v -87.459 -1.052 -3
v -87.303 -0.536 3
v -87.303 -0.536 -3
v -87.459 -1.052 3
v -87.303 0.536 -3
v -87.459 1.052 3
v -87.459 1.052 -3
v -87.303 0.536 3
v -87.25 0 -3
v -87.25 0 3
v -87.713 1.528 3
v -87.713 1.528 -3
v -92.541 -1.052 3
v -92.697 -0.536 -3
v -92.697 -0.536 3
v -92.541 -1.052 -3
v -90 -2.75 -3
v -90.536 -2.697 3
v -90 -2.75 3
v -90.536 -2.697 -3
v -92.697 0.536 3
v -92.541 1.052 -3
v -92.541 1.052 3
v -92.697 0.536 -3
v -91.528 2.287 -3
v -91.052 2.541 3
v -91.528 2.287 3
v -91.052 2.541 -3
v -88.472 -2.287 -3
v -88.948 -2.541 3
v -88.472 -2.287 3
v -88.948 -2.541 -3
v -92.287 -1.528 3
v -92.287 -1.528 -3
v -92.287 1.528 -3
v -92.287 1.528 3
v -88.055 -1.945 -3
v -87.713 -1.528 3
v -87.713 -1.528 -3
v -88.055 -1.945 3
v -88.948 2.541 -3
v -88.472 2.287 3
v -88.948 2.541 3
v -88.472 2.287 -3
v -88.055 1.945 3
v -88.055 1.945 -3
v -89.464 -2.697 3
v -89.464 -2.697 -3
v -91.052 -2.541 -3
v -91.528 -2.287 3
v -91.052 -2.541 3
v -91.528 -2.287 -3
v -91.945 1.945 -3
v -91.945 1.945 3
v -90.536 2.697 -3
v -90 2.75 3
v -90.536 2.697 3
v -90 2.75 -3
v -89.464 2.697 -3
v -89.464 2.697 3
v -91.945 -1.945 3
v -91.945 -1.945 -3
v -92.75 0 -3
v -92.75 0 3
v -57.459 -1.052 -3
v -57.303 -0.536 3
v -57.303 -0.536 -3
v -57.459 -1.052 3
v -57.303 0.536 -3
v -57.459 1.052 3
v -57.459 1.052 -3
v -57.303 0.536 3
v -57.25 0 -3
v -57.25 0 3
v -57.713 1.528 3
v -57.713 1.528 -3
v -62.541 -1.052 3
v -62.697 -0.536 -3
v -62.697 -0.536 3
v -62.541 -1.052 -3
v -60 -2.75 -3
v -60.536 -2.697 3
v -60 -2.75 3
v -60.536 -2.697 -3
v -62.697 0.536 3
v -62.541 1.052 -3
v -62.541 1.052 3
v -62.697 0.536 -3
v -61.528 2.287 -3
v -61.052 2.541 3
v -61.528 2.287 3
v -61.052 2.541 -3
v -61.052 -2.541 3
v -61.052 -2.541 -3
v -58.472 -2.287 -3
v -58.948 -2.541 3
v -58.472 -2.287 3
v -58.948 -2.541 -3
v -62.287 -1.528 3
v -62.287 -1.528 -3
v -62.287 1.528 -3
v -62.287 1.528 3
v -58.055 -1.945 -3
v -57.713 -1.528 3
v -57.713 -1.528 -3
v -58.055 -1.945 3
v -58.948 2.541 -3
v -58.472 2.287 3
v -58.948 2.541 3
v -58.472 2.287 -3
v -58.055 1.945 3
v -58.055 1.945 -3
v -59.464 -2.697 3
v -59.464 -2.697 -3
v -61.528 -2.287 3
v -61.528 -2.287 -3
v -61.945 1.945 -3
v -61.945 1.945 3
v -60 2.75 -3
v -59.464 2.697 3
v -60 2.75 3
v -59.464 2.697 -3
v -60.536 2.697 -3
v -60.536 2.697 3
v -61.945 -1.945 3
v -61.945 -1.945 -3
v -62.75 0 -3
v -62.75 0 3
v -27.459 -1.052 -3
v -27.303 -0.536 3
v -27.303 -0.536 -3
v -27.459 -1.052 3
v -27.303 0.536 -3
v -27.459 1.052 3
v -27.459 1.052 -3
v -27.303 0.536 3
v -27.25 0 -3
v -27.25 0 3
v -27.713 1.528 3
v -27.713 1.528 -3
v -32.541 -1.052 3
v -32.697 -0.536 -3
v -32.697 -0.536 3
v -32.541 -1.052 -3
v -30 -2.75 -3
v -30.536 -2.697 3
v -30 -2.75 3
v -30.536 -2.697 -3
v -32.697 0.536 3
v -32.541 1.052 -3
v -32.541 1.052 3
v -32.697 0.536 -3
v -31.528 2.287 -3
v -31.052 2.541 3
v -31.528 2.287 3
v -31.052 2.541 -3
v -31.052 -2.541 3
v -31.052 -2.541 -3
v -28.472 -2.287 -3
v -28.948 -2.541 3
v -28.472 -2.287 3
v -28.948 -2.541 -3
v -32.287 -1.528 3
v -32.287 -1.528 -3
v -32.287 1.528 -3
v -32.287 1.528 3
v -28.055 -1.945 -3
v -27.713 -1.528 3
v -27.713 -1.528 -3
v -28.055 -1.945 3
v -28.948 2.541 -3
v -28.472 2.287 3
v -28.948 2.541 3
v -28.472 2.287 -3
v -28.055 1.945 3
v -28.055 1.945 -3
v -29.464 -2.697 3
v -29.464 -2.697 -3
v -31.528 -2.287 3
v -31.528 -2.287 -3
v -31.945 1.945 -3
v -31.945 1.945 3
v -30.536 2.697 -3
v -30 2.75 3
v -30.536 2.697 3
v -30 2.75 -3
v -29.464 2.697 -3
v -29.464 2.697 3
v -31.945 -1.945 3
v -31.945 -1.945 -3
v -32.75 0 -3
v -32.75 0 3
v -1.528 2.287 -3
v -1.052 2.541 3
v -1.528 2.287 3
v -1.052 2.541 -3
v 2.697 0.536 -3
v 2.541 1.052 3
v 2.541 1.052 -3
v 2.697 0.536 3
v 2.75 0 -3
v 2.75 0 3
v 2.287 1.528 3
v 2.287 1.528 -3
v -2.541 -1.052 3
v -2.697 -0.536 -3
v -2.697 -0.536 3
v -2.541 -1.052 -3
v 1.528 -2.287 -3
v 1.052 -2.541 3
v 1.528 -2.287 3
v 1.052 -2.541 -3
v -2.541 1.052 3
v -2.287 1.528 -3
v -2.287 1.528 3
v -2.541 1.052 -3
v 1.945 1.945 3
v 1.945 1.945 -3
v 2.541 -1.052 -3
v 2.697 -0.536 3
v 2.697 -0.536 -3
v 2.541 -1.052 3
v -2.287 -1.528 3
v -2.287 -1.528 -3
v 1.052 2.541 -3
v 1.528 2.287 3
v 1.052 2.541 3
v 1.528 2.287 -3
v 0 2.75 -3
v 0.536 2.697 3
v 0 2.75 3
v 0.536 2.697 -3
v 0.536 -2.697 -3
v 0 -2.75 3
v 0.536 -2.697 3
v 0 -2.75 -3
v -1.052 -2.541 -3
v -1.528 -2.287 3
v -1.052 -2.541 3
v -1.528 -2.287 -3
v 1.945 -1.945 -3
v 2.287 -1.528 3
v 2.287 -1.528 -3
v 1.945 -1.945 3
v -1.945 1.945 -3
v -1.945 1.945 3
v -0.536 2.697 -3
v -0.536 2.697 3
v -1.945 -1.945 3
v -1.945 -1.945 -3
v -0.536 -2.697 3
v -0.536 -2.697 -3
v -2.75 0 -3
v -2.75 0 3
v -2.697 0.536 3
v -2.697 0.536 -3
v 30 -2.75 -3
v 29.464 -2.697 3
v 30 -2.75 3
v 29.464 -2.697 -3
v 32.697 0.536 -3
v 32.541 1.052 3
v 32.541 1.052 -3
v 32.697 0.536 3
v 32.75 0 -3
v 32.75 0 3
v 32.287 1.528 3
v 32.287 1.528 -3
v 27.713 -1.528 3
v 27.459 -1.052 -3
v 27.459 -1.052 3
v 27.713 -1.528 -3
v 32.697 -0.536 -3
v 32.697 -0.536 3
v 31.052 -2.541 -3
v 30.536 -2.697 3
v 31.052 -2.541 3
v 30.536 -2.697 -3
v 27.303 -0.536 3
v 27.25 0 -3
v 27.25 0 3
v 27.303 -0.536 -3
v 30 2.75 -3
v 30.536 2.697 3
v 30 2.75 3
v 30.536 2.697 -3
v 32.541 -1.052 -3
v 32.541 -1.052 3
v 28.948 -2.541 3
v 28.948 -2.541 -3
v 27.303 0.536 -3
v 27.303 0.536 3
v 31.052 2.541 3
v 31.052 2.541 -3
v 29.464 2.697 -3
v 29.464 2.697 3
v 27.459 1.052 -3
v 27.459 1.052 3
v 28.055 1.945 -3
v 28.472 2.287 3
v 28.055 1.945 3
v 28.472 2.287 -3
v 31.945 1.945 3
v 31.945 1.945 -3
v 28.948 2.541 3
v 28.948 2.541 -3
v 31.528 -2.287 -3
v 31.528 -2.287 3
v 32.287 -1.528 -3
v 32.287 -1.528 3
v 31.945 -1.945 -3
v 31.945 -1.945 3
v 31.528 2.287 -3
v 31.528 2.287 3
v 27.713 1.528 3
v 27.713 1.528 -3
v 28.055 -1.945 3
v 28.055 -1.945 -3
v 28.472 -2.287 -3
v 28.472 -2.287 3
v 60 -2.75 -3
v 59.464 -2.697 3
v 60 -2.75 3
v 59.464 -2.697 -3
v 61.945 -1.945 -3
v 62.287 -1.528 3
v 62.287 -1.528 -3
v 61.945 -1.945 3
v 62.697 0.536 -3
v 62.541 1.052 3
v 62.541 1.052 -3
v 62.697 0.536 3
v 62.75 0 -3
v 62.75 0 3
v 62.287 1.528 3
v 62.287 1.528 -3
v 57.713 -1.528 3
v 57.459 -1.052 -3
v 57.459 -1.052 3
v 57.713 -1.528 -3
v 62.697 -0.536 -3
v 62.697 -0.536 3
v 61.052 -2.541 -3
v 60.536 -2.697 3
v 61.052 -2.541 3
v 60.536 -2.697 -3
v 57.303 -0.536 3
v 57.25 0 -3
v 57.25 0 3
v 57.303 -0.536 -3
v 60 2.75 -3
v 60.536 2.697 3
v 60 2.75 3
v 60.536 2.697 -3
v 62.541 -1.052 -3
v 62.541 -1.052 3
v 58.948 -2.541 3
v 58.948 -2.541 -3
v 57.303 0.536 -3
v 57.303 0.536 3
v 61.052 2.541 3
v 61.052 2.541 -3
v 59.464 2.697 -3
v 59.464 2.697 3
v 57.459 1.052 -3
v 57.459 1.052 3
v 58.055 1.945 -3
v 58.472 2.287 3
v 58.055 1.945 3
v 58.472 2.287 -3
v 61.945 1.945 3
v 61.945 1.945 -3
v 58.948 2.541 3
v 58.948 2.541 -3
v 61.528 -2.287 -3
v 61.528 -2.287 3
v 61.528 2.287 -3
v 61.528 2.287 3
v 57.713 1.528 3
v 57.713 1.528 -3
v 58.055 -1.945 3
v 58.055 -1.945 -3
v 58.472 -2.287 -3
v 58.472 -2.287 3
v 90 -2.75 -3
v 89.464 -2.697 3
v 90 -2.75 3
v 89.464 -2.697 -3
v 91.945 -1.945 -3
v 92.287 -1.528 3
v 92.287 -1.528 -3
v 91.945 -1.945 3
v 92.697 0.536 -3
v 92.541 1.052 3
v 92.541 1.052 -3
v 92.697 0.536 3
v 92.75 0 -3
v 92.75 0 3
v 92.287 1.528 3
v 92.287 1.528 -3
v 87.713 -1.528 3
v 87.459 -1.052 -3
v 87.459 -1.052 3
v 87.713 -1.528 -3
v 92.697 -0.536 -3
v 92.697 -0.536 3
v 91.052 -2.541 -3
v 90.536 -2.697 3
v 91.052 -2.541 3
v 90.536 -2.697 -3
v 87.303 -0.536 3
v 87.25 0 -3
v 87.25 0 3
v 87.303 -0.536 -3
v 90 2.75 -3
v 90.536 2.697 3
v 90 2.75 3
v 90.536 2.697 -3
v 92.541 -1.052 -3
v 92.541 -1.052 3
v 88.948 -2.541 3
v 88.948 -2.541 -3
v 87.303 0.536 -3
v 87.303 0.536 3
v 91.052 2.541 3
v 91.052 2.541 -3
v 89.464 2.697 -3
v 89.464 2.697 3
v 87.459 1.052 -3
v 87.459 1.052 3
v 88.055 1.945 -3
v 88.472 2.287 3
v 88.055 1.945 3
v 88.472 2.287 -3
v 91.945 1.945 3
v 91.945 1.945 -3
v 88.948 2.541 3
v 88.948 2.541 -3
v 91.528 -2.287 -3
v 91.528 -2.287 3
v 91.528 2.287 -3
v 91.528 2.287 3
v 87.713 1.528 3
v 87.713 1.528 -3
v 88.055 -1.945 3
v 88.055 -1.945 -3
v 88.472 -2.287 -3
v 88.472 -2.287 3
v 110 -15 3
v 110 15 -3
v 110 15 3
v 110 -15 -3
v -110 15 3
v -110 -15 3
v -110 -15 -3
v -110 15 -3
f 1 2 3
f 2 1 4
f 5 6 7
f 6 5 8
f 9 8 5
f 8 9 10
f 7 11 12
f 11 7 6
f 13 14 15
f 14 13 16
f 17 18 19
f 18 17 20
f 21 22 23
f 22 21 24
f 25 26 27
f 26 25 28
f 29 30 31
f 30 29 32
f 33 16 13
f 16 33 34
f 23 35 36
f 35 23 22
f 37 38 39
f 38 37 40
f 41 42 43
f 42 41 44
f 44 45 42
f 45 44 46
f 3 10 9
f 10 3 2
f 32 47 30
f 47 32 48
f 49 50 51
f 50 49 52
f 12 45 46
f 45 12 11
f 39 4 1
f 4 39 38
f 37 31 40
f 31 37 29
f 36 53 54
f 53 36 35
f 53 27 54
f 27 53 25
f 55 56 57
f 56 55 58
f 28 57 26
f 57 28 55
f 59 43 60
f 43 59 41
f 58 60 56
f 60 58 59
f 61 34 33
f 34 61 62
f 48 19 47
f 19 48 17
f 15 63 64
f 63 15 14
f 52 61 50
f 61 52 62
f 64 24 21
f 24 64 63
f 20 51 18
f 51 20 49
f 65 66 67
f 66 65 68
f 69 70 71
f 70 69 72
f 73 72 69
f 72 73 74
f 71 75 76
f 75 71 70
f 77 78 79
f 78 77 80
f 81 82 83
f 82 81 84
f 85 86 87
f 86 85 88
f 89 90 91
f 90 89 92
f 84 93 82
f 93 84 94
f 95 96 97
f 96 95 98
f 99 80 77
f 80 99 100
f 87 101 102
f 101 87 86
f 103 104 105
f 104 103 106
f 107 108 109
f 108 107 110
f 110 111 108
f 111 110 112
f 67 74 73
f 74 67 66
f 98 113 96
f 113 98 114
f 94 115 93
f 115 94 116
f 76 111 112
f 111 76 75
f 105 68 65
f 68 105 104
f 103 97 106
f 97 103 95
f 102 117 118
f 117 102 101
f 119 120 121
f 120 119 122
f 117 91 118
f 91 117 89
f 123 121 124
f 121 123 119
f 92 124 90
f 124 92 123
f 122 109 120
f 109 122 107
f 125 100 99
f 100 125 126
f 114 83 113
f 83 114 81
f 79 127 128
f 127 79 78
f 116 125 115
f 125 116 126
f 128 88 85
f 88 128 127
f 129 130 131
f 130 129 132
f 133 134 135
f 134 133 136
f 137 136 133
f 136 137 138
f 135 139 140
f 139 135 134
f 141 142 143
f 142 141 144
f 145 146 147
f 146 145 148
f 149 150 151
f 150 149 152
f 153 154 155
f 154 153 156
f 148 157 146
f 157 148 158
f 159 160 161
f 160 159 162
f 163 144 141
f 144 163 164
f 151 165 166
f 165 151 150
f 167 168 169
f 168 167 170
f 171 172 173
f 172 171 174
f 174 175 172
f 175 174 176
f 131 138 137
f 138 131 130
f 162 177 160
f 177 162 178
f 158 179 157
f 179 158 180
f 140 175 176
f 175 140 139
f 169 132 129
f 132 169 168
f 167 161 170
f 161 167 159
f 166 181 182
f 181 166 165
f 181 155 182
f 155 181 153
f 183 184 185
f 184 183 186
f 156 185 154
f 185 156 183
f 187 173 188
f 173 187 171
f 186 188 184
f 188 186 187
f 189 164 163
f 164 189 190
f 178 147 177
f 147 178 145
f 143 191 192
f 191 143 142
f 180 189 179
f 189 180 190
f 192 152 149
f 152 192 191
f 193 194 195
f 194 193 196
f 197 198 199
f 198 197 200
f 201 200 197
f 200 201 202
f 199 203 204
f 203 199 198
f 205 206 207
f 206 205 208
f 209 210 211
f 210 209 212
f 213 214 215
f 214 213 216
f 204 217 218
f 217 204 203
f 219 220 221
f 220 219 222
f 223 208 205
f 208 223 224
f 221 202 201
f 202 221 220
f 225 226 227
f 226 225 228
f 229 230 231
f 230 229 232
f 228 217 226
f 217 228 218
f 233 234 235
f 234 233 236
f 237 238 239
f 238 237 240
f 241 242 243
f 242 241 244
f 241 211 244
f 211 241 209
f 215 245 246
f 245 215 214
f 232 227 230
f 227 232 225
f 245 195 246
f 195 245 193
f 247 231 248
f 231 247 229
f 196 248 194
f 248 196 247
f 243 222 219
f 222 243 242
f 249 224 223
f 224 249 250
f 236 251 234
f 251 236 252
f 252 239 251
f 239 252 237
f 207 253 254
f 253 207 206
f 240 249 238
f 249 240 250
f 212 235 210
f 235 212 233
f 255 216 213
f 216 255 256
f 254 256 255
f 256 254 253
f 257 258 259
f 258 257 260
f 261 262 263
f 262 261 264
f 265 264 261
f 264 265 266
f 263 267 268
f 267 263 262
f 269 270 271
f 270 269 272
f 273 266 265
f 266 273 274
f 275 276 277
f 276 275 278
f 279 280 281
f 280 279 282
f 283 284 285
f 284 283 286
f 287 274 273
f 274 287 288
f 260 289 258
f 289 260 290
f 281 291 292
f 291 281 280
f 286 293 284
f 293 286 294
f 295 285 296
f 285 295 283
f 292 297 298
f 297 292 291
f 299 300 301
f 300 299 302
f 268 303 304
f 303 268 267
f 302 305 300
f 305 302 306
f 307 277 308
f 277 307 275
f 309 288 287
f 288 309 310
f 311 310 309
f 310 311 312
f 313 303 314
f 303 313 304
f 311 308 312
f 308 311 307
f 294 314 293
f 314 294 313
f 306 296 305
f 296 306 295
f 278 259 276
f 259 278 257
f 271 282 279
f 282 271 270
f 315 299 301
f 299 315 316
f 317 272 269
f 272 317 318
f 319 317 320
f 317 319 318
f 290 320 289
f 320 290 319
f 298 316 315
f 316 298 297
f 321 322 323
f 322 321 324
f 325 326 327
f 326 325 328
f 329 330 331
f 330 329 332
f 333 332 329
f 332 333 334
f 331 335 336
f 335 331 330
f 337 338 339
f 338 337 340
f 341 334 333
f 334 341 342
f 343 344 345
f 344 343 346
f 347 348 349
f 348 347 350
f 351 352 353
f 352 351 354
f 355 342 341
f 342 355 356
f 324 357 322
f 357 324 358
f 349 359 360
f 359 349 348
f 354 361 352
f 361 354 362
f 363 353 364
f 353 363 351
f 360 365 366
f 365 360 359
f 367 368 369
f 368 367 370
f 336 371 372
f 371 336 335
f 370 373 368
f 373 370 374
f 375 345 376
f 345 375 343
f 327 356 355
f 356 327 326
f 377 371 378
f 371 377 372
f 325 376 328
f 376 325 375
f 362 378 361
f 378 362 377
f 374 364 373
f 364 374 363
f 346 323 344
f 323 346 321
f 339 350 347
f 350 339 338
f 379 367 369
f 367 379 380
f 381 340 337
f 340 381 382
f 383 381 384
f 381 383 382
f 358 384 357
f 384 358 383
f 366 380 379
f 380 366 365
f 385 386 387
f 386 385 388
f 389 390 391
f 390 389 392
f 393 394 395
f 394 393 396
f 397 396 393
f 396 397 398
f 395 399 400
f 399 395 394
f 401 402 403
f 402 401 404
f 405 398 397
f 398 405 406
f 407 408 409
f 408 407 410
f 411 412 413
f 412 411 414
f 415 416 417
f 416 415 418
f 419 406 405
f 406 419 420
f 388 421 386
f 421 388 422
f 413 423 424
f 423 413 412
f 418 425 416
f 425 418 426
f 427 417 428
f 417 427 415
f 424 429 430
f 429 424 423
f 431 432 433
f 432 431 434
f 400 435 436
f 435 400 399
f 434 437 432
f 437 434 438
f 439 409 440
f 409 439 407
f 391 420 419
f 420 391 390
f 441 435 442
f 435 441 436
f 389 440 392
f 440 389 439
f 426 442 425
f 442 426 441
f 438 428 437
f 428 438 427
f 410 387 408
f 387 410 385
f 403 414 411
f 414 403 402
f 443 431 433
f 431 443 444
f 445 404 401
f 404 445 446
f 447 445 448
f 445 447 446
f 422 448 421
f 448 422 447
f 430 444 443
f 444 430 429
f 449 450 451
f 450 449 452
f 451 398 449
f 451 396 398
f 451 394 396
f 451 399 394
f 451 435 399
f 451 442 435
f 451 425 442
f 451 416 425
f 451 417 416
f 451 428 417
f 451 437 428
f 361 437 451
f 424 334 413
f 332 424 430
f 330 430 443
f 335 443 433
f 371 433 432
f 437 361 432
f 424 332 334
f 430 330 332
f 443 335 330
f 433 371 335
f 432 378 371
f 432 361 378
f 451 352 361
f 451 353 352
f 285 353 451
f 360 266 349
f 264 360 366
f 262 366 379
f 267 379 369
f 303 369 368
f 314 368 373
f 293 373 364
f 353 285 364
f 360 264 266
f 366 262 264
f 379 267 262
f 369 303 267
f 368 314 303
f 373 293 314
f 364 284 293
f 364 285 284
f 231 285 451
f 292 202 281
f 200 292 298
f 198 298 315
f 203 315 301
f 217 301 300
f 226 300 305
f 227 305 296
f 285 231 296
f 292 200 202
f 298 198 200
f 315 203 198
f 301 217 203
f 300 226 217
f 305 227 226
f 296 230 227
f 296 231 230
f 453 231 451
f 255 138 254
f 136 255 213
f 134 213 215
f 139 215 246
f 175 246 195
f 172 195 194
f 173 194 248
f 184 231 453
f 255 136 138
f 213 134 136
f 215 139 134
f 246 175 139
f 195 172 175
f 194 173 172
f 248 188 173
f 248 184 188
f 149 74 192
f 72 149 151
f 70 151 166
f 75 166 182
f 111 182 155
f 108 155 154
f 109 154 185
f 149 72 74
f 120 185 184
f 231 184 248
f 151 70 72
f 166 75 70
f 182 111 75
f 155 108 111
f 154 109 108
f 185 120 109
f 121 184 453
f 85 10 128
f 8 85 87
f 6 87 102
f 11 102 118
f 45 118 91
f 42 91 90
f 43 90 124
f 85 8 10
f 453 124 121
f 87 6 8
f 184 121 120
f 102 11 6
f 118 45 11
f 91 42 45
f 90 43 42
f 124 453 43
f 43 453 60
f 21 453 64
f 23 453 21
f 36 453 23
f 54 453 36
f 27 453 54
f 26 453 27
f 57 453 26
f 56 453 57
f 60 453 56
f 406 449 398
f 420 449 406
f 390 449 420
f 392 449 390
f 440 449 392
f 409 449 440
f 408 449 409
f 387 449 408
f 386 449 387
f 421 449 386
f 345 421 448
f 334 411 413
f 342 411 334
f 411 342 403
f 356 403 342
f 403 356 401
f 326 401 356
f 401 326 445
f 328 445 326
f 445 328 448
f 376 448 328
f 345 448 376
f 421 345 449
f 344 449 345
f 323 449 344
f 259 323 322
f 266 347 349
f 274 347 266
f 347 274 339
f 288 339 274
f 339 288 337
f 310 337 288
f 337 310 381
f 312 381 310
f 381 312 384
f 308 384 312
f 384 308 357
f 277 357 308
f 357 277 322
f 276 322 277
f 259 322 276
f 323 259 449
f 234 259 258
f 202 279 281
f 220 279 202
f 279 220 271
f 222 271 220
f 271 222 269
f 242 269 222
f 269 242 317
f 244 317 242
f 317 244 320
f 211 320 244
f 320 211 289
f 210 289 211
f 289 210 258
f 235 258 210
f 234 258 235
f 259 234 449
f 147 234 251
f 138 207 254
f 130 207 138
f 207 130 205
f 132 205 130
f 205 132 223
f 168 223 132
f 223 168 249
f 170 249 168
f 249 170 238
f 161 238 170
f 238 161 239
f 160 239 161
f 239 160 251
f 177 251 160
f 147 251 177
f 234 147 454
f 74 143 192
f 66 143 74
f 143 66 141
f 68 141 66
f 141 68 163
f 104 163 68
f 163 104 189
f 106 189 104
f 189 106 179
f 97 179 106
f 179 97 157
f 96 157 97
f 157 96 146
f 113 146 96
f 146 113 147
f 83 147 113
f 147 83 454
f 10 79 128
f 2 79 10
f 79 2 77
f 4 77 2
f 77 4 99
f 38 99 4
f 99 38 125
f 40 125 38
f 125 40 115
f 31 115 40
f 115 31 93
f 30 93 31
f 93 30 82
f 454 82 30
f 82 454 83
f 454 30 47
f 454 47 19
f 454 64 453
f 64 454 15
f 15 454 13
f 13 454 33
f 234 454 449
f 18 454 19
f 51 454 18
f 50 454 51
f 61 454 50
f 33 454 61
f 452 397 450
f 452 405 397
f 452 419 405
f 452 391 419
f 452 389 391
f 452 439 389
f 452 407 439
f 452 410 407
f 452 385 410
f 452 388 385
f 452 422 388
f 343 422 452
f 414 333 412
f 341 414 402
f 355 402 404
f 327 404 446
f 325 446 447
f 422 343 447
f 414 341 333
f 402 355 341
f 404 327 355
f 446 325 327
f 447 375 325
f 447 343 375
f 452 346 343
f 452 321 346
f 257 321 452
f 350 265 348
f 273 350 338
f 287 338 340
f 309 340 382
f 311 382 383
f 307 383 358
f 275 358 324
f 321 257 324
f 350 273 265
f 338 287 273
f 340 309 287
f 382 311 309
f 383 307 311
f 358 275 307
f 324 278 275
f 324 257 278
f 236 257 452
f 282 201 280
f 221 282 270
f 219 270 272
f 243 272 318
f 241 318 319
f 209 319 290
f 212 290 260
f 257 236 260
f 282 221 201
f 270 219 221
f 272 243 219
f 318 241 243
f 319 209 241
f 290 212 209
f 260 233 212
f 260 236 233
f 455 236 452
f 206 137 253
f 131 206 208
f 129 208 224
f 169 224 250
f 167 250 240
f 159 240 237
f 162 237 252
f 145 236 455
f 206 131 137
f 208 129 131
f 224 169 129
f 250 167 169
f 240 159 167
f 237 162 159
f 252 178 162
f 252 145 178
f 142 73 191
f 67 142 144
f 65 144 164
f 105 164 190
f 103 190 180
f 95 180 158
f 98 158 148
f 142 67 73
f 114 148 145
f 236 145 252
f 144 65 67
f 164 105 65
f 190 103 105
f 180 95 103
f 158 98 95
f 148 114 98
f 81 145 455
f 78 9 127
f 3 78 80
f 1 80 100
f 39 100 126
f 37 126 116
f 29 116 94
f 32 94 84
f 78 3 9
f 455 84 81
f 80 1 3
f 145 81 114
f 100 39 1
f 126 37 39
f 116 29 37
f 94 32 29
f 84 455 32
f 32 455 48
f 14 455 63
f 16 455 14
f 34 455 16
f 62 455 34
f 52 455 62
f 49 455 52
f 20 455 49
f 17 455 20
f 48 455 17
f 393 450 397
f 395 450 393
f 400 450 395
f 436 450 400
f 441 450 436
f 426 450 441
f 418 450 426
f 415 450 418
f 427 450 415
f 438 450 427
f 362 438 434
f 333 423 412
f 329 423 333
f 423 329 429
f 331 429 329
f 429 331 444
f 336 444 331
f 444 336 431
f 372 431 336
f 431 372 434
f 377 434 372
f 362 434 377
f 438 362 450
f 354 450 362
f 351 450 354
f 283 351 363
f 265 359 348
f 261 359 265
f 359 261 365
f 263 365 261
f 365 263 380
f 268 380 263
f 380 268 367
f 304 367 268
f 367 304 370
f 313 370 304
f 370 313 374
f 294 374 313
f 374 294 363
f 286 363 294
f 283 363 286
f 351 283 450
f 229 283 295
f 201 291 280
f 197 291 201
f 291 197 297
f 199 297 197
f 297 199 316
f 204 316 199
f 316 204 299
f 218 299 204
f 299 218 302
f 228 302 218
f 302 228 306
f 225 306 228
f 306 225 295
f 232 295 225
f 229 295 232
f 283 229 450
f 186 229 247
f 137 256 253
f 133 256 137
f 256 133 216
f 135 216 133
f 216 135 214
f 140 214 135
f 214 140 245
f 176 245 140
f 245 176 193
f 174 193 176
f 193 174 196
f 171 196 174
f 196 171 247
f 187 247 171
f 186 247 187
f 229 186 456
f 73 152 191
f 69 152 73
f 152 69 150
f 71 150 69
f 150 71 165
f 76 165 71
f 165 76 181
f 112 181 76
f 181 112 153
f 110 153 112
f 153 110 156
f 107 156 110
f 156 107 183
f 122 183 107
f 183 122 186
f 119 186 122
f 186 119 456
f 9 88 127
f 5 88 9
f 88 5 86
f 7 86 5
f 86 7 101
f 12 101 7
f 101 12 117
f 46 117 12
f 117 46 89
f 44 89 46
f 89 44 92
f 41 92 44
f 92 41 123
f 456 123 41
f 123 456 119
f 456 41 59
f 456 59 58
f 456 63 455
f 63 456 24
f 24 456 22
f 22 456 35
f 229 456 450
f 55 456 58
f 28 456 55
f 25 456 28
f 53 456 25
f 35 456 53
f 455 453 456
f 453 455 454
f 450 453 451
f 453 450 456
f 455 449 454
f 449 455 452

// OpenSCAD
$fn = 32;

// ----------------------------------------------------------------------
// Hole bar, 7 x Ø5.5
// row layout, 20 mm edge offset
// ----------------------------------------------------------------------

// --- parameters (mm) ---
bar_w = 30;    // bar width (Y)
bar_t = 6;     // bar thickness (Z)
holes = 7;     // holes per row
hole_d = 5.5;  // hole diameter
edge = 20;     // offset from the bar end to the first hole
pitch = 30;    // pitch between neighbouring holes

// --- derived feature positions (mm) ---
span = (holes - 1) * pitch;   // = 180   distance between the end holes
bar_l = span + 2 * edge;      // = 220   overall bar length
start_x = -bar_l / 2 + edge;  // = -90   X of the first hole
feature_centers = [
  [start_x + 0 * pitch, 0],
  [start_x + 1 * pitch, 0],
  [start_x + 2 * pitch, 0],
  [start_x + 3 * pitch, 0],
  [start_x + 4 * pitch, 0],
  [start_x + 5 * pitch, 0],
  [start_x + 6 * pitch, 0]
];   // hole centres of the first row

// bar with one row of holes, drilled from feature_centers
difference() {
  translate([-bar_l / 2, -bar_w / 2, -bar_t / 2]) cube([bar_l, bar_w, bar_t]);
  for (centre = feature_centers)
    translate([centre[0], centre[1], 0])
      cylinder(d = hole_d, h = bar_t + 2, center = true);
}
